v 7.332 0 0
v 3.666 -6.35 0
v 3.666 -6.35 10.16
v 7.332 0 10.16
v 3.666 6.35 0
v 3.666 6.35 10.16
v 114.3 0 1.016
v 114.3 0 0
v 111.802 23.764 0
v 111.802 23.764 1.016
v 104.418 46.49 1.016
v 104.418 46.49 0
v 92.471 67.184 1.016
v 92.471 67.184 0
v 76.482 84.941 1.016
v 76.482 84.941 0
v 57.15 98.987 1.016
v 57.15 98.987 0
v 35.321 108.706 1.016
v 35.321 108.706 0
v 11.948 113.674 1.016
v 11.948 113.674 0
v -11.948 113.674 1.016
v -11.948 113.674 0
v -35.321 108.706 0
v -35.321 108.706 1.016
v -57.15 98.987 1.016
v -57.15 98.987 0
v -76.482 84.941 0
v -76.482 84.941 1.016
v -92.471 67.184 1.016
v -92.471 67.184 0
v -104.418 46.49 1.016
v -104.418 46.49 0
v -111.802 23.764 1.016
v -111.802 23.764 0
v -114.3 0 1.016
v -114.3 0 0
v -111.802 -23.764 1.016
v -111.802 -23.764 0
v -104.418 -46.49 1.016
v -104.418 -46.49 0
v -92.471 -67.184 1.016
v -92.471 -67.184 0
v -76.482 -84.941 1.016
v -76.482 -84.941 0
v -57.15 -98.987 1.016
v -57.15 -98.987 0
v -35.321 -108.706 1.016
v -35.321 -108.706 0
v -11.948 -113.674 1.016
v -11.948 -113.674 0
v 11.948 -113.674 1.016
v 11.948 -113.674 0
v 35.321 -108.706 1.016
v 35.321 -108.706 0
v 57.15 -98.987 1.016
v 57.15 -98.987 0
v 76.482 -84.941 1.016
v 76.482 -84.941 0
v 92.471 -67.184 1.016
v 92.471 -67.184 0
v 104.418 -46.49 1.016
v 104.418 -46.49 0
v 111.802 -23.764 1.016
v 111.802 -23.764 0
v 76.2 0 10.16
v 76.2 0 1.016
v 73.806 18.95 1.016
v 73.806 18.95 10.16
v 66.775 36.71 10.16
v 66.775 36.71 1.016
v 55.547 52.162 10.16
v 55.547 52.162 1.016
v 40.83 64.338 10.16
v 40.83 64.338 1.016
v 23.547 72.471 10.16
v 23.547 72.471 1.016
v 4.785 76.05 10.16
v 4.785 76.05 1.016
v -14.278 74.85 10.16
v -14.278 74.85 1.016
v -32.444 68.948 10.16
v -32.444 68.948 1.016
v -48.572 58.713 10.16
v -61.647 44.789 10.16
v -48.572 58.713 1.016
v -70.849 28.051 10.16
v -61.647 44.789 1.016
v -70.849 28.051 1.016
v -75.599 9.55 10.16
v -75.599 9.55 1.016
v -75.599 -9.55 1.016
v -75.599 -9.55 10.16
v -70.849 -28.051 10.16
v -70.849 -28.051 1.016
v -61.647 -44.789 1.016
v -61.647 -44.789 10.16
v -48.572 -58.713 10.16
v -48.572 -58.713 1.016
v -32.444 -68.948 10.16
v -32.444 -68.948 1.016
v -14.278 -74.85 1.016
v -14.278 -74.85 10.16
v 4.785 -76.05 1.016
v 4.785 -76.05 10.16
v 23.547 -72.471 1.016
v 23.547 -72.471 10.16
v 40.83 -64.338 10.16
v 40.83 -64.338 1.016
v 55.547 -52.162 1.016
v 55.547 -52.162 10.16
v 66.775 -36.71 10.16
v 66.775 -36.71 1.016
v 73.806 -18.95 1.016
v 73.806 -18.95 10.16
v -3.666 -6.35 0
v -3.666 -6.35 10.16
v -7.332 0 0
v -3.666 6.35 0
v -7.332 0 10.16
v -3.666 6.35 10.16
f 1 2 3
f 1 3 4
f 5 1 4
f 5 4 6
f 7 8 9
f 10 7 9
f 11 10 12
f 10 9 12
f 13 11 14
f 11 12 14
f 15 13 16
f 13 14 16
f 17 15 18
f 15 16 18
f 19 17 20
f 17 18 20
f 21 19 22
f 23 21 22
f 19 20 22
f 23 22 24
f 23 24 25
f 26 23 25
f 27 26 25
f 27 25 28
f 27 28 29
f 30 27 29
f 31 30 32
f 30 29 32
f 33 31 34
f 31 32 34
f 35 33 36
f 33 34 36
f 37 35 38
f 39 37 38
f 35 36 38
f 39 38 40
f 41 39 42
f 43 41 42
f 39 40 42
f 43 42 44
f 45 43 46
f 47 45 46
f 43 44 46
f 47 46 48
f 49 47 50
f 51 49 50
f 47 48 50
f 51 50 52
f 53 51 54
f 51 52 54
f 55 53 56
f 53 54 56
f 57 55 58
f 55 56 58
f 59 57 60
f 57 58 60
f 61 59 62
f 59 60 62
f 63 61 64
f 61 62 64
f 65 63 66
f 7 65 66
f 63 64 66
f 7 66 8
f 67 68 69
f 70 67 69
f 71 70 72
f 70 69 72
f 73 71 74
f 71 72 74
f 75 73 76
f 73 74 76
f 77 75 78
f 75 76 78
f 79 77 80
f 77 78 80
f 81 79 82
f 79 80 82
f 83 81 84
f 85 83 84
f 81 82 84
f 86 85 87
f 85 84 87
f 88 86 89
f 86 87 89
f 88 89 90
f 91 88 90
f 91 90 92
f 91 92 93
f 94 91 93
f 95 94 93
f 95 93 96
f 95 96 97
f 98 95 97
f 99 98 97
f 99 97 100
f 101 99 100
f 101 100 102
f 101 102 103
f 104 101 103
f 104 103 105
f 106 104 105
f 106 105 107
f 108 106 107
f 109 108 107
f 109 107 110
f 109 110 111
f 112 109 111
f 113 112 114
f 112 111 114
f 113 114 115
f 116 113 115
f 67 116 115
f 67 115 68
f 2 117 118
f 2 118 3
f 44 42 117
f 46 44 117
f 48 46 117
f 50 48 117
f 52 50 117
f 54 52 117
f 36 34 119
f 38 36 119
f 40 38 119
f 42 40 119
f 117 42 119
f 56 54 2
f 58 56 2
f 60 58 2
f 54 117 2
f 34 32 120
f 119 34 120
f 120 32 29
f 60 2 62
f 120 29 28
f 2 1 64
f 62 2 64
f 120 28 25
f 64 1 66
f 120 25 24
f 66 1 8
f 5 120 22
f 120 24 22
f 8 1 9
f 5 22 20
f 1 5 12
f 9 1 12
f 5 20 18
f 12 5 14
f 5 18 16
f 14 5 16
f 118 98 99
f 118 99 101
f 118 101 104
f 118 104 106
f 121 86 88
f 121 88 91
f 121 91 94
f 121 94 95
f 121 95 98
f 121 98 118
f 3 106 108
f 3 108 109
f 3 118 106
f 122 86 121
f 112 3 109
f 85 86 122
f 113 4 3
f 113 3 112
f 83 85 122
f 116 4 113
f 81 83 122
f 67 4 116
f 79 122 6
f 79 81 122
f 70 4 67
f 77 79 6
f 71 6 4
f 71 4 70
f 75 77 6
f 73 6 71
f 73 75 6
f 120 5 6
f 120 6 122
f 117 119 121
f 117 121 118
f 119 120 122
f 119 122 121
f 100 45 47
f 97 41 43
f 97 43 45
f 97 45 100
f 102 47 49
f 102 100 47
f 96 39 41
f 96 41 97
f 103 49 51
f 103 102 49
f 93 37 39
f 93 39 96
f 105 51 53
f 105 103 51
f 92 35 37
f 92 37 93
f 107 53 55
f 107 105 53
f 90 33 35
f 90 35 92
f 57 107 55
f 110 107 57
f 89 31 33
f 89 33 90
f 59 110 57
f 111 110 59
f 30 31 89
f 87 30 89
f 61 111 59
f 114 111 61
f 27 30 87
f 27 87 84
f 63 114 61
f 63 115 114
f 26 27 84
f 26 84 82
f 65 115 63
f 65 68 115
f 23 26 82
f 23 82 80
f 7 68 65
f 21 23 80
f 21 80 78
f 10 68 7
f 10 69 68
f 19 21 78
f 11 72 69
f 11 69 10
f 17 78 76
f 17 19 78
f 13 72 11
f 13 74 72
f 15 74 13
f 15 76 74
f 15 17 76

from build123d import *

# Parameters (mm, degrees)
F0_R     = 114.3
F2_DEPTH = 1.016
F1_R     = 76.2
F3_DEPTH = 10.16
F5_DEPTH = 25.4


with BuildPart() as f2:
    # F0 (on Top) → F2 (new body)
    with BuildSketch(Plane.XY):
        Circle(F0_R)
    extrude(amount=F2_DEPTH)

    # F1 (on Top) → F3 (join)
    with BuildSketch(Plane.XY):
        Circle(F1_R)
    extrude(amount=F3_DEPTH)

    # F4 (on Top) → F5 (cut)
    with BuildSketch(Plane.XY):
        Polygon((7.3323484187, 0), (3.6661742094, 6.35), (-3.6661742094, 6.35), (-7.3323484187, 0), (-3.6661742094, -6.35), (3.6661742094, -6.35), align=None)
    extrude(amount=F5_DEPTH, mode=Mode.SUBTRACT)


solid = f2.part
